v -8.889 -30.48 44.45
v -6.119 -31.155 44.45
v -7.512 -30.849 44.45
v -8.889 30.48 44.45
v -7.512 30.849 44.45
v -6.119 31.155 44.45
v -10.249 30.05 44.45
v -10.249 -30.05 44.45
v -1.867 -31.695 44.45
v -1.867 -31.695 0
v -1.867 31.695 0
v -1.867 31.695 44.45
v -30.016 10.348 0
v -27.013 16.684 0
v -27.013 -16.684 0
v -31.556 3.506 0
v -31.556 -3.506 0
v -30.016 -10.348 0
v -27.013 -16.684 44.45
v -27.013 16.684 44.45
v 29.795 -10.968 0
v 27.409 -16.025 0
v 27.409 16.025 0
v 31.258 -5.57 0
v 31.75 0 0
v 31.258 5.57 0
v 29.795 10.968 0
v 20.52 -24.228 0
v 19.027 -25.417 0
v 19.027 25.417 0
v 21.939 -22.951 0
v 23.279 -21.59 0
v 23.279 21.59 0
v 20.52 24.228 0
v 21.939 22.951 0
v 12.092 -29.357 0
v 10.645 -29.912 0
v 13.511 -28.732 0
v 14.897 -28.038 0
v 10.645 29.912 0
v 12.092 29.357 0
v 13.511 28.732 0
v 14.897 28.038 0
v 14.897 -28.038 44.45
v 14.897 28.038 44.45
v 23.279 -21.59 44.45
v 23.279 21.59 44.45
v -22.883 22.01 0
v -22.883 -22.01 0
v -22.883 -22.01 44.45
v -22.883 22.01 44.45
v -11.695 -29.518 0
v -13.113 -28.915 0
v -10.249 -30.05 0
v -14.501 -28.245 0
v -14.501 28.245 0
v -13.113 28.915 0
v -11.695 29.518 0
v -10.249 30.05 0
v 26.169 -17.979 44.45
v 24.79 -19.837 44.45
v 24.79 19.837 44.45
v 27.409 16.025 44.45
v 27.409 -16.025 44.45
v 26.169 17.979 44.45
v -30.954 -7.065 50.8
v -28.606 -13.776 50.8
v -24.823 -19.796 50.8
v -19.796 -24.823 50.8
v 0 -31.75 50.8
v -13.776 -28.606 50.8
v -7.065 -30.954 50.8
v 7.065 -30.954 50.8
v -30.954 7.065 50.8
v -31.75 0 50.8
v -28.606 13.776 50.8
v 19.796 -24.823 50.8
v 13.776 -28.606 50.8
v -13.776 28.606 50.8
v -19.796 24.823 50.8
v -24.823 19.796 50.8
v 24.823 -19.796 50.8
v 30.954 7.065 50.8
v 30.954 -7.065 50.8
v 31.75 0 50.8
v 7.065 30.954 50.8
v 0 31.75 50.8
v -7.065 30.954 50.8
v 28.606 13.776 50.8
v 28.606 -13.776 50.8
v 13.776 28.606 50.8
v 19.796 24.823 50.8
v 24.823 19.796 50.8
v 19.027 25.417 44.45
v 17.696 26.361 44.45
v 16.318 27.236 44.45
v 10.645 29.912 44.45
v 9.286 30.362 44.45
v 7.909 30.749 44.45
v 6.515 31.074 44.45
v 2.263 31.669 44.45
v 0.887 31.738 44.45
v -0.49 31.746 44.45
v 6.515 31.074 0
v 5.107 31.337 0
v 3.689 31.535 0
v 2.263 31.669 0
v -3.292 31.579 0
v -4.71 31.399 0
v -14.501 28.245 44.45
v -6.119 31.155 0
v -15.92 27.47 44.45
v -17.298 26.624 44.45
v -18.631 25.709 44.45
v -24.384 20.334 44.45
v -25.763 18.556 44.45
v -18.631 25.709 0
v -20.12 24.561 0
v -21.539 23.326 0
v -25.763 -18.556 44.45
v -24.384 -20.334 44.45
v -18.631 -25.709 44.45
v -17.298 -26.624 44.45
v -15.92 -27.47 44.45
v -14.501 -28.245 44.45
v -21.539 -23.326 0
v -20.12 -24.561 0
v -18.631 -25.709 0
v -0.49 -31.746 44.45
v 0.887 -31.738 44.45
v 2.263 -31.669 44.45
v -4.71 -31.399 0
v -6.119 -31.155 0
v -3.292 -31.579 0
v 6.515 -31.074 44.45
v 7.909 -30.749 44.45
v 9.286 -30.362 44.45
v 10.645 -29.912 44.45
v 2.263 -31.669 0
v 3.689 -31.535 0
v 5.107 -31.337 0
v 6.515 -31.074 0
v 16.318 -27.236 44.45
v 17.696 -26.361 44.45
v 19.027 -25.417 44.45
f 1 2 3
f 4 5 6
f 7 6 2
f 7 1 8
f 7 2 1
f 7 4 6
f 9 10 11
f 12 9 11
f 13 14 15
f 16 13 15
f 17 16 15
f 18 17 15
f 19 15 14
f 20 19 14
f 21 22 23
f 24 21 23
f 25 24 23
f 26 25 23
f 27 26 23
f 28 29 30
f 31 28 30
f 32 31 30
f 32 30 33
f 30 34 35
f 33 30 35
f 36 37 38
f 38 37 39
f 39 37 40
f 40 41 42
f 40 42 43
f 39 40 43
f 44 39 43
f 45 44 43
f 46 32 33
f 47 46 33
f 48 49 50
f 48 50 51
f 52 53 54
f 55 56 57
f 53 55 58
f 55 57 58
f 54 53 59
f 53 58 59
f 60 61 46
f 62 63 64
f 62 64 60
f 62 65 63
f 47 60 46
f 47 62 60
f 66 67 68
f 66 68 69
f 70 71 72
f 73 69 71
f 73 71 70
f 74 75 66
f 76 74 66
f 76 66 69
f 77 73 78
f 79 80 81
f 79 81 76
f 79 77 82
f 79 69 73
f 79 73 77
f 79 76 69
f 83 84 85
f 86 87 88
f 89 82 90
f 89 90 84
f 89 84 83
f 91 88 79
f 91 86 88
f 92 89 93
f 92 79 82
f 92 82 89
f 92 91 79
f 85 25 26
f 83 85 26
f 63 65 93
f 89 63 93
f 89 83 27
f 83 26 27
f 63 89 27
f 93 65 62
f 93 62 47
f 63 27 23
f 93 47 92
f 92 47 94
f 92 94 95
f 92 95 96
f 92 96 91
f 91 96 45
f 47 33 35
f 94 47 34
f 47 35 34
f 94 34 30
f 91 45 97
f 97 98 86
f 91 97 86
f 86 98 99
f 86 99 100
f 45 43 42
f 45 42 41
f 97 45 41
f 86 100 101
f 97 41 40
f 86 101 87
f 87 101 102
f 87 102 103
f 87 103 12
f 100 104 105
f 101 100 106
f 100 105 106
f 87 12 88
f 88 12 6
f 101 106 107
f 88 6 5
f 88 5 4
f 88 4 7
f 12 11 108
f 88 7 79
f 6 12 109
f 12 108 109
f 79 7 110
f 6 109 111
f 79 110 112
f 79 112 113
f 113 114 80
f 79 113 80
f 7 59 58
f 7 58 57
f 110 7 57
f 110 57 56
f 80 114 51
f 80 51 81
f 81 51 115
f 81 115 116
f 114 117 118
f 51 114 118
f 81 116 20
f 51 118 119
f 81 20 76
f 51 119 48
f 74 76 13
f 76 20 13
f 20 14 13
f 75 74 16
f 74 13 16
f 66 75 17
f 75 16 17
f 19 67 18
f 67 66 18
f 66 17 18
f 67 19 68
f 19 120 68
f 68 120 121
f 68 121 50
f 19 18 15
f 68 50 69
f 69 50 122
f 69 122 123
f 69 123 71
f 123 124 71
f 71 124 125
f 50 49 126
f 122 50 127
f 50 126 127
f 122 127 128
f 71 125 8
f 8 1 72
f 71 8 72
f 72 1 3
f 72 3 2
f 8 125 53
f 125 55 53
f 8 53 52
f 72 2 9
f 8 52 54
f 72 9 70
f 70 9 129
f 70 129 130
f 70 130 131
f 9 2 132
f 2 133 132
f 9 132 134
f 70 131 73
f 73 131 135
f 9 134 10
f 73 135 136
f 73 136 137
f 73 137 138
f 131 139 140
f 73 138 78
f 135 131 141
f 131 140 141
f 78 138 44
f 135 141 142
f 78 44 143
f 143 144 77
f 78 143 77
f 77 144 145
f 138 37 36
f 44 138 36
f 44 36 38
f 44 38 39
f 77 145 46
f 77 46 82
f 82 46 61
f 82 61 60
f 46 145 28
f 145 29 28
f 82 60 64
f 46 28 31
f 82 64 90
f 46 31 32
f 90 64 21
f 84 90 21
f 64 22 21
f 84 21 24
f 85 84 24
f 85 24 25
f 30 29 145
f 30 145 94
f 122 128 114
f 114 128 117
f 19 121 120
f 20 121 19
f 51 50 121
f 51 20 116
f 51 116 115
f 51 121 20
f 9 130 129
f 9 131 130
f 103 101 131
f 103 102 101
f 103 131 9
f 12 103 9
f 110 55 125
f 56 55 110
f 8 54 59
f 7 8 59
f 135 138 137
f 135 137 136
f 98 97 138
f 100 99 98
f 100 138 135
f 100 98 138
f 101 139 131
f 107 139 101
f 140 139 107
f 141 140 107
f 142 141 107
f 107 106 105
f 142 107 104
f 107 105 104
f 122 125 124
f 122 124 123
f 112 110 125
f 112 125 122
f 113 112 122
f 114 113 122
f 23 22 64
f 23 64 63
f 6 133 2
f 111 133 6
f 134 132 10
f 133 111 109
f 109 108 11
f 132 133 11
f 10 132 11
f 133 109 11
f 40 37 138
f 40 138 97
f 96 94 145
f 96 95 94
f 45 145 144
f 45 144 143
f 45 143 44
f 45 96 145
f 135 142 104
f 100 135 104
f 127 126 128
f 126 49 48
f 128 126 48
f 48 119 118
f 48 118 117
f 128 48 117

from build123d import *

# Parameters (mm, degrees)
ESQUISSE1_R             = 31.75
BOSS_EXTRU_1_DEPTH      = 50.8
ESQUISSE3_W             = 4.13004
ESQUISSE3_H             = 63.5
ENL_V_MAT_EXTRU_1_DEPTH = 44.45


with BuildPart() as part:
    # Esquisse1 → Boss.-Extru.1 (new body)
    with BuildSketch(Plane.XY):
        Circle(ESQUISSE1_R)
    extrude(amount=BOSS_EXTRU_1_DEPTH)

    # Esquisse3 → Enlèv. mat.-Extru.1 (cut)
    with BuildSketch(Plane(origin=(0, 0, 0), x_dir=(-1, 0, 0), z_dir=(0, 0, -1))):
        with Locations((-16.96212, 0)):
            Rectangle(ESQUISSE3_W, ESQUISSE3_H)
        with Locations((-25.34412, 0)):
            Rectangle(ESQUISSE3_W, ESQUISSE3_H)
        with Locations((-8.58012, 0)):
            Rectangle(ESQUISSE3_W, ESQUISSE3_H)
        with Locations((-0.19812, 0)):
            Rectangle(ESQUISSE3_W, ESQUISSE3_H)
        with Locations((8.18388, 0)):
            Rectangle(ESQUISSE3_W, ESQUISSE3_H)
        with Locations((16.56588, 0)):
            Rectangle(ESQUISSE3_W, ESQUISSE3_H)
        with Locations((24.94788, 0)):
            Rectangle(ESQUISSE3_W, ESQUISSE3_H)
    extrude(amount=-ENL_V_MAT_EXTRU_1_DEPTH, mode=Mode.SUBTRACT)


solid = part.part
